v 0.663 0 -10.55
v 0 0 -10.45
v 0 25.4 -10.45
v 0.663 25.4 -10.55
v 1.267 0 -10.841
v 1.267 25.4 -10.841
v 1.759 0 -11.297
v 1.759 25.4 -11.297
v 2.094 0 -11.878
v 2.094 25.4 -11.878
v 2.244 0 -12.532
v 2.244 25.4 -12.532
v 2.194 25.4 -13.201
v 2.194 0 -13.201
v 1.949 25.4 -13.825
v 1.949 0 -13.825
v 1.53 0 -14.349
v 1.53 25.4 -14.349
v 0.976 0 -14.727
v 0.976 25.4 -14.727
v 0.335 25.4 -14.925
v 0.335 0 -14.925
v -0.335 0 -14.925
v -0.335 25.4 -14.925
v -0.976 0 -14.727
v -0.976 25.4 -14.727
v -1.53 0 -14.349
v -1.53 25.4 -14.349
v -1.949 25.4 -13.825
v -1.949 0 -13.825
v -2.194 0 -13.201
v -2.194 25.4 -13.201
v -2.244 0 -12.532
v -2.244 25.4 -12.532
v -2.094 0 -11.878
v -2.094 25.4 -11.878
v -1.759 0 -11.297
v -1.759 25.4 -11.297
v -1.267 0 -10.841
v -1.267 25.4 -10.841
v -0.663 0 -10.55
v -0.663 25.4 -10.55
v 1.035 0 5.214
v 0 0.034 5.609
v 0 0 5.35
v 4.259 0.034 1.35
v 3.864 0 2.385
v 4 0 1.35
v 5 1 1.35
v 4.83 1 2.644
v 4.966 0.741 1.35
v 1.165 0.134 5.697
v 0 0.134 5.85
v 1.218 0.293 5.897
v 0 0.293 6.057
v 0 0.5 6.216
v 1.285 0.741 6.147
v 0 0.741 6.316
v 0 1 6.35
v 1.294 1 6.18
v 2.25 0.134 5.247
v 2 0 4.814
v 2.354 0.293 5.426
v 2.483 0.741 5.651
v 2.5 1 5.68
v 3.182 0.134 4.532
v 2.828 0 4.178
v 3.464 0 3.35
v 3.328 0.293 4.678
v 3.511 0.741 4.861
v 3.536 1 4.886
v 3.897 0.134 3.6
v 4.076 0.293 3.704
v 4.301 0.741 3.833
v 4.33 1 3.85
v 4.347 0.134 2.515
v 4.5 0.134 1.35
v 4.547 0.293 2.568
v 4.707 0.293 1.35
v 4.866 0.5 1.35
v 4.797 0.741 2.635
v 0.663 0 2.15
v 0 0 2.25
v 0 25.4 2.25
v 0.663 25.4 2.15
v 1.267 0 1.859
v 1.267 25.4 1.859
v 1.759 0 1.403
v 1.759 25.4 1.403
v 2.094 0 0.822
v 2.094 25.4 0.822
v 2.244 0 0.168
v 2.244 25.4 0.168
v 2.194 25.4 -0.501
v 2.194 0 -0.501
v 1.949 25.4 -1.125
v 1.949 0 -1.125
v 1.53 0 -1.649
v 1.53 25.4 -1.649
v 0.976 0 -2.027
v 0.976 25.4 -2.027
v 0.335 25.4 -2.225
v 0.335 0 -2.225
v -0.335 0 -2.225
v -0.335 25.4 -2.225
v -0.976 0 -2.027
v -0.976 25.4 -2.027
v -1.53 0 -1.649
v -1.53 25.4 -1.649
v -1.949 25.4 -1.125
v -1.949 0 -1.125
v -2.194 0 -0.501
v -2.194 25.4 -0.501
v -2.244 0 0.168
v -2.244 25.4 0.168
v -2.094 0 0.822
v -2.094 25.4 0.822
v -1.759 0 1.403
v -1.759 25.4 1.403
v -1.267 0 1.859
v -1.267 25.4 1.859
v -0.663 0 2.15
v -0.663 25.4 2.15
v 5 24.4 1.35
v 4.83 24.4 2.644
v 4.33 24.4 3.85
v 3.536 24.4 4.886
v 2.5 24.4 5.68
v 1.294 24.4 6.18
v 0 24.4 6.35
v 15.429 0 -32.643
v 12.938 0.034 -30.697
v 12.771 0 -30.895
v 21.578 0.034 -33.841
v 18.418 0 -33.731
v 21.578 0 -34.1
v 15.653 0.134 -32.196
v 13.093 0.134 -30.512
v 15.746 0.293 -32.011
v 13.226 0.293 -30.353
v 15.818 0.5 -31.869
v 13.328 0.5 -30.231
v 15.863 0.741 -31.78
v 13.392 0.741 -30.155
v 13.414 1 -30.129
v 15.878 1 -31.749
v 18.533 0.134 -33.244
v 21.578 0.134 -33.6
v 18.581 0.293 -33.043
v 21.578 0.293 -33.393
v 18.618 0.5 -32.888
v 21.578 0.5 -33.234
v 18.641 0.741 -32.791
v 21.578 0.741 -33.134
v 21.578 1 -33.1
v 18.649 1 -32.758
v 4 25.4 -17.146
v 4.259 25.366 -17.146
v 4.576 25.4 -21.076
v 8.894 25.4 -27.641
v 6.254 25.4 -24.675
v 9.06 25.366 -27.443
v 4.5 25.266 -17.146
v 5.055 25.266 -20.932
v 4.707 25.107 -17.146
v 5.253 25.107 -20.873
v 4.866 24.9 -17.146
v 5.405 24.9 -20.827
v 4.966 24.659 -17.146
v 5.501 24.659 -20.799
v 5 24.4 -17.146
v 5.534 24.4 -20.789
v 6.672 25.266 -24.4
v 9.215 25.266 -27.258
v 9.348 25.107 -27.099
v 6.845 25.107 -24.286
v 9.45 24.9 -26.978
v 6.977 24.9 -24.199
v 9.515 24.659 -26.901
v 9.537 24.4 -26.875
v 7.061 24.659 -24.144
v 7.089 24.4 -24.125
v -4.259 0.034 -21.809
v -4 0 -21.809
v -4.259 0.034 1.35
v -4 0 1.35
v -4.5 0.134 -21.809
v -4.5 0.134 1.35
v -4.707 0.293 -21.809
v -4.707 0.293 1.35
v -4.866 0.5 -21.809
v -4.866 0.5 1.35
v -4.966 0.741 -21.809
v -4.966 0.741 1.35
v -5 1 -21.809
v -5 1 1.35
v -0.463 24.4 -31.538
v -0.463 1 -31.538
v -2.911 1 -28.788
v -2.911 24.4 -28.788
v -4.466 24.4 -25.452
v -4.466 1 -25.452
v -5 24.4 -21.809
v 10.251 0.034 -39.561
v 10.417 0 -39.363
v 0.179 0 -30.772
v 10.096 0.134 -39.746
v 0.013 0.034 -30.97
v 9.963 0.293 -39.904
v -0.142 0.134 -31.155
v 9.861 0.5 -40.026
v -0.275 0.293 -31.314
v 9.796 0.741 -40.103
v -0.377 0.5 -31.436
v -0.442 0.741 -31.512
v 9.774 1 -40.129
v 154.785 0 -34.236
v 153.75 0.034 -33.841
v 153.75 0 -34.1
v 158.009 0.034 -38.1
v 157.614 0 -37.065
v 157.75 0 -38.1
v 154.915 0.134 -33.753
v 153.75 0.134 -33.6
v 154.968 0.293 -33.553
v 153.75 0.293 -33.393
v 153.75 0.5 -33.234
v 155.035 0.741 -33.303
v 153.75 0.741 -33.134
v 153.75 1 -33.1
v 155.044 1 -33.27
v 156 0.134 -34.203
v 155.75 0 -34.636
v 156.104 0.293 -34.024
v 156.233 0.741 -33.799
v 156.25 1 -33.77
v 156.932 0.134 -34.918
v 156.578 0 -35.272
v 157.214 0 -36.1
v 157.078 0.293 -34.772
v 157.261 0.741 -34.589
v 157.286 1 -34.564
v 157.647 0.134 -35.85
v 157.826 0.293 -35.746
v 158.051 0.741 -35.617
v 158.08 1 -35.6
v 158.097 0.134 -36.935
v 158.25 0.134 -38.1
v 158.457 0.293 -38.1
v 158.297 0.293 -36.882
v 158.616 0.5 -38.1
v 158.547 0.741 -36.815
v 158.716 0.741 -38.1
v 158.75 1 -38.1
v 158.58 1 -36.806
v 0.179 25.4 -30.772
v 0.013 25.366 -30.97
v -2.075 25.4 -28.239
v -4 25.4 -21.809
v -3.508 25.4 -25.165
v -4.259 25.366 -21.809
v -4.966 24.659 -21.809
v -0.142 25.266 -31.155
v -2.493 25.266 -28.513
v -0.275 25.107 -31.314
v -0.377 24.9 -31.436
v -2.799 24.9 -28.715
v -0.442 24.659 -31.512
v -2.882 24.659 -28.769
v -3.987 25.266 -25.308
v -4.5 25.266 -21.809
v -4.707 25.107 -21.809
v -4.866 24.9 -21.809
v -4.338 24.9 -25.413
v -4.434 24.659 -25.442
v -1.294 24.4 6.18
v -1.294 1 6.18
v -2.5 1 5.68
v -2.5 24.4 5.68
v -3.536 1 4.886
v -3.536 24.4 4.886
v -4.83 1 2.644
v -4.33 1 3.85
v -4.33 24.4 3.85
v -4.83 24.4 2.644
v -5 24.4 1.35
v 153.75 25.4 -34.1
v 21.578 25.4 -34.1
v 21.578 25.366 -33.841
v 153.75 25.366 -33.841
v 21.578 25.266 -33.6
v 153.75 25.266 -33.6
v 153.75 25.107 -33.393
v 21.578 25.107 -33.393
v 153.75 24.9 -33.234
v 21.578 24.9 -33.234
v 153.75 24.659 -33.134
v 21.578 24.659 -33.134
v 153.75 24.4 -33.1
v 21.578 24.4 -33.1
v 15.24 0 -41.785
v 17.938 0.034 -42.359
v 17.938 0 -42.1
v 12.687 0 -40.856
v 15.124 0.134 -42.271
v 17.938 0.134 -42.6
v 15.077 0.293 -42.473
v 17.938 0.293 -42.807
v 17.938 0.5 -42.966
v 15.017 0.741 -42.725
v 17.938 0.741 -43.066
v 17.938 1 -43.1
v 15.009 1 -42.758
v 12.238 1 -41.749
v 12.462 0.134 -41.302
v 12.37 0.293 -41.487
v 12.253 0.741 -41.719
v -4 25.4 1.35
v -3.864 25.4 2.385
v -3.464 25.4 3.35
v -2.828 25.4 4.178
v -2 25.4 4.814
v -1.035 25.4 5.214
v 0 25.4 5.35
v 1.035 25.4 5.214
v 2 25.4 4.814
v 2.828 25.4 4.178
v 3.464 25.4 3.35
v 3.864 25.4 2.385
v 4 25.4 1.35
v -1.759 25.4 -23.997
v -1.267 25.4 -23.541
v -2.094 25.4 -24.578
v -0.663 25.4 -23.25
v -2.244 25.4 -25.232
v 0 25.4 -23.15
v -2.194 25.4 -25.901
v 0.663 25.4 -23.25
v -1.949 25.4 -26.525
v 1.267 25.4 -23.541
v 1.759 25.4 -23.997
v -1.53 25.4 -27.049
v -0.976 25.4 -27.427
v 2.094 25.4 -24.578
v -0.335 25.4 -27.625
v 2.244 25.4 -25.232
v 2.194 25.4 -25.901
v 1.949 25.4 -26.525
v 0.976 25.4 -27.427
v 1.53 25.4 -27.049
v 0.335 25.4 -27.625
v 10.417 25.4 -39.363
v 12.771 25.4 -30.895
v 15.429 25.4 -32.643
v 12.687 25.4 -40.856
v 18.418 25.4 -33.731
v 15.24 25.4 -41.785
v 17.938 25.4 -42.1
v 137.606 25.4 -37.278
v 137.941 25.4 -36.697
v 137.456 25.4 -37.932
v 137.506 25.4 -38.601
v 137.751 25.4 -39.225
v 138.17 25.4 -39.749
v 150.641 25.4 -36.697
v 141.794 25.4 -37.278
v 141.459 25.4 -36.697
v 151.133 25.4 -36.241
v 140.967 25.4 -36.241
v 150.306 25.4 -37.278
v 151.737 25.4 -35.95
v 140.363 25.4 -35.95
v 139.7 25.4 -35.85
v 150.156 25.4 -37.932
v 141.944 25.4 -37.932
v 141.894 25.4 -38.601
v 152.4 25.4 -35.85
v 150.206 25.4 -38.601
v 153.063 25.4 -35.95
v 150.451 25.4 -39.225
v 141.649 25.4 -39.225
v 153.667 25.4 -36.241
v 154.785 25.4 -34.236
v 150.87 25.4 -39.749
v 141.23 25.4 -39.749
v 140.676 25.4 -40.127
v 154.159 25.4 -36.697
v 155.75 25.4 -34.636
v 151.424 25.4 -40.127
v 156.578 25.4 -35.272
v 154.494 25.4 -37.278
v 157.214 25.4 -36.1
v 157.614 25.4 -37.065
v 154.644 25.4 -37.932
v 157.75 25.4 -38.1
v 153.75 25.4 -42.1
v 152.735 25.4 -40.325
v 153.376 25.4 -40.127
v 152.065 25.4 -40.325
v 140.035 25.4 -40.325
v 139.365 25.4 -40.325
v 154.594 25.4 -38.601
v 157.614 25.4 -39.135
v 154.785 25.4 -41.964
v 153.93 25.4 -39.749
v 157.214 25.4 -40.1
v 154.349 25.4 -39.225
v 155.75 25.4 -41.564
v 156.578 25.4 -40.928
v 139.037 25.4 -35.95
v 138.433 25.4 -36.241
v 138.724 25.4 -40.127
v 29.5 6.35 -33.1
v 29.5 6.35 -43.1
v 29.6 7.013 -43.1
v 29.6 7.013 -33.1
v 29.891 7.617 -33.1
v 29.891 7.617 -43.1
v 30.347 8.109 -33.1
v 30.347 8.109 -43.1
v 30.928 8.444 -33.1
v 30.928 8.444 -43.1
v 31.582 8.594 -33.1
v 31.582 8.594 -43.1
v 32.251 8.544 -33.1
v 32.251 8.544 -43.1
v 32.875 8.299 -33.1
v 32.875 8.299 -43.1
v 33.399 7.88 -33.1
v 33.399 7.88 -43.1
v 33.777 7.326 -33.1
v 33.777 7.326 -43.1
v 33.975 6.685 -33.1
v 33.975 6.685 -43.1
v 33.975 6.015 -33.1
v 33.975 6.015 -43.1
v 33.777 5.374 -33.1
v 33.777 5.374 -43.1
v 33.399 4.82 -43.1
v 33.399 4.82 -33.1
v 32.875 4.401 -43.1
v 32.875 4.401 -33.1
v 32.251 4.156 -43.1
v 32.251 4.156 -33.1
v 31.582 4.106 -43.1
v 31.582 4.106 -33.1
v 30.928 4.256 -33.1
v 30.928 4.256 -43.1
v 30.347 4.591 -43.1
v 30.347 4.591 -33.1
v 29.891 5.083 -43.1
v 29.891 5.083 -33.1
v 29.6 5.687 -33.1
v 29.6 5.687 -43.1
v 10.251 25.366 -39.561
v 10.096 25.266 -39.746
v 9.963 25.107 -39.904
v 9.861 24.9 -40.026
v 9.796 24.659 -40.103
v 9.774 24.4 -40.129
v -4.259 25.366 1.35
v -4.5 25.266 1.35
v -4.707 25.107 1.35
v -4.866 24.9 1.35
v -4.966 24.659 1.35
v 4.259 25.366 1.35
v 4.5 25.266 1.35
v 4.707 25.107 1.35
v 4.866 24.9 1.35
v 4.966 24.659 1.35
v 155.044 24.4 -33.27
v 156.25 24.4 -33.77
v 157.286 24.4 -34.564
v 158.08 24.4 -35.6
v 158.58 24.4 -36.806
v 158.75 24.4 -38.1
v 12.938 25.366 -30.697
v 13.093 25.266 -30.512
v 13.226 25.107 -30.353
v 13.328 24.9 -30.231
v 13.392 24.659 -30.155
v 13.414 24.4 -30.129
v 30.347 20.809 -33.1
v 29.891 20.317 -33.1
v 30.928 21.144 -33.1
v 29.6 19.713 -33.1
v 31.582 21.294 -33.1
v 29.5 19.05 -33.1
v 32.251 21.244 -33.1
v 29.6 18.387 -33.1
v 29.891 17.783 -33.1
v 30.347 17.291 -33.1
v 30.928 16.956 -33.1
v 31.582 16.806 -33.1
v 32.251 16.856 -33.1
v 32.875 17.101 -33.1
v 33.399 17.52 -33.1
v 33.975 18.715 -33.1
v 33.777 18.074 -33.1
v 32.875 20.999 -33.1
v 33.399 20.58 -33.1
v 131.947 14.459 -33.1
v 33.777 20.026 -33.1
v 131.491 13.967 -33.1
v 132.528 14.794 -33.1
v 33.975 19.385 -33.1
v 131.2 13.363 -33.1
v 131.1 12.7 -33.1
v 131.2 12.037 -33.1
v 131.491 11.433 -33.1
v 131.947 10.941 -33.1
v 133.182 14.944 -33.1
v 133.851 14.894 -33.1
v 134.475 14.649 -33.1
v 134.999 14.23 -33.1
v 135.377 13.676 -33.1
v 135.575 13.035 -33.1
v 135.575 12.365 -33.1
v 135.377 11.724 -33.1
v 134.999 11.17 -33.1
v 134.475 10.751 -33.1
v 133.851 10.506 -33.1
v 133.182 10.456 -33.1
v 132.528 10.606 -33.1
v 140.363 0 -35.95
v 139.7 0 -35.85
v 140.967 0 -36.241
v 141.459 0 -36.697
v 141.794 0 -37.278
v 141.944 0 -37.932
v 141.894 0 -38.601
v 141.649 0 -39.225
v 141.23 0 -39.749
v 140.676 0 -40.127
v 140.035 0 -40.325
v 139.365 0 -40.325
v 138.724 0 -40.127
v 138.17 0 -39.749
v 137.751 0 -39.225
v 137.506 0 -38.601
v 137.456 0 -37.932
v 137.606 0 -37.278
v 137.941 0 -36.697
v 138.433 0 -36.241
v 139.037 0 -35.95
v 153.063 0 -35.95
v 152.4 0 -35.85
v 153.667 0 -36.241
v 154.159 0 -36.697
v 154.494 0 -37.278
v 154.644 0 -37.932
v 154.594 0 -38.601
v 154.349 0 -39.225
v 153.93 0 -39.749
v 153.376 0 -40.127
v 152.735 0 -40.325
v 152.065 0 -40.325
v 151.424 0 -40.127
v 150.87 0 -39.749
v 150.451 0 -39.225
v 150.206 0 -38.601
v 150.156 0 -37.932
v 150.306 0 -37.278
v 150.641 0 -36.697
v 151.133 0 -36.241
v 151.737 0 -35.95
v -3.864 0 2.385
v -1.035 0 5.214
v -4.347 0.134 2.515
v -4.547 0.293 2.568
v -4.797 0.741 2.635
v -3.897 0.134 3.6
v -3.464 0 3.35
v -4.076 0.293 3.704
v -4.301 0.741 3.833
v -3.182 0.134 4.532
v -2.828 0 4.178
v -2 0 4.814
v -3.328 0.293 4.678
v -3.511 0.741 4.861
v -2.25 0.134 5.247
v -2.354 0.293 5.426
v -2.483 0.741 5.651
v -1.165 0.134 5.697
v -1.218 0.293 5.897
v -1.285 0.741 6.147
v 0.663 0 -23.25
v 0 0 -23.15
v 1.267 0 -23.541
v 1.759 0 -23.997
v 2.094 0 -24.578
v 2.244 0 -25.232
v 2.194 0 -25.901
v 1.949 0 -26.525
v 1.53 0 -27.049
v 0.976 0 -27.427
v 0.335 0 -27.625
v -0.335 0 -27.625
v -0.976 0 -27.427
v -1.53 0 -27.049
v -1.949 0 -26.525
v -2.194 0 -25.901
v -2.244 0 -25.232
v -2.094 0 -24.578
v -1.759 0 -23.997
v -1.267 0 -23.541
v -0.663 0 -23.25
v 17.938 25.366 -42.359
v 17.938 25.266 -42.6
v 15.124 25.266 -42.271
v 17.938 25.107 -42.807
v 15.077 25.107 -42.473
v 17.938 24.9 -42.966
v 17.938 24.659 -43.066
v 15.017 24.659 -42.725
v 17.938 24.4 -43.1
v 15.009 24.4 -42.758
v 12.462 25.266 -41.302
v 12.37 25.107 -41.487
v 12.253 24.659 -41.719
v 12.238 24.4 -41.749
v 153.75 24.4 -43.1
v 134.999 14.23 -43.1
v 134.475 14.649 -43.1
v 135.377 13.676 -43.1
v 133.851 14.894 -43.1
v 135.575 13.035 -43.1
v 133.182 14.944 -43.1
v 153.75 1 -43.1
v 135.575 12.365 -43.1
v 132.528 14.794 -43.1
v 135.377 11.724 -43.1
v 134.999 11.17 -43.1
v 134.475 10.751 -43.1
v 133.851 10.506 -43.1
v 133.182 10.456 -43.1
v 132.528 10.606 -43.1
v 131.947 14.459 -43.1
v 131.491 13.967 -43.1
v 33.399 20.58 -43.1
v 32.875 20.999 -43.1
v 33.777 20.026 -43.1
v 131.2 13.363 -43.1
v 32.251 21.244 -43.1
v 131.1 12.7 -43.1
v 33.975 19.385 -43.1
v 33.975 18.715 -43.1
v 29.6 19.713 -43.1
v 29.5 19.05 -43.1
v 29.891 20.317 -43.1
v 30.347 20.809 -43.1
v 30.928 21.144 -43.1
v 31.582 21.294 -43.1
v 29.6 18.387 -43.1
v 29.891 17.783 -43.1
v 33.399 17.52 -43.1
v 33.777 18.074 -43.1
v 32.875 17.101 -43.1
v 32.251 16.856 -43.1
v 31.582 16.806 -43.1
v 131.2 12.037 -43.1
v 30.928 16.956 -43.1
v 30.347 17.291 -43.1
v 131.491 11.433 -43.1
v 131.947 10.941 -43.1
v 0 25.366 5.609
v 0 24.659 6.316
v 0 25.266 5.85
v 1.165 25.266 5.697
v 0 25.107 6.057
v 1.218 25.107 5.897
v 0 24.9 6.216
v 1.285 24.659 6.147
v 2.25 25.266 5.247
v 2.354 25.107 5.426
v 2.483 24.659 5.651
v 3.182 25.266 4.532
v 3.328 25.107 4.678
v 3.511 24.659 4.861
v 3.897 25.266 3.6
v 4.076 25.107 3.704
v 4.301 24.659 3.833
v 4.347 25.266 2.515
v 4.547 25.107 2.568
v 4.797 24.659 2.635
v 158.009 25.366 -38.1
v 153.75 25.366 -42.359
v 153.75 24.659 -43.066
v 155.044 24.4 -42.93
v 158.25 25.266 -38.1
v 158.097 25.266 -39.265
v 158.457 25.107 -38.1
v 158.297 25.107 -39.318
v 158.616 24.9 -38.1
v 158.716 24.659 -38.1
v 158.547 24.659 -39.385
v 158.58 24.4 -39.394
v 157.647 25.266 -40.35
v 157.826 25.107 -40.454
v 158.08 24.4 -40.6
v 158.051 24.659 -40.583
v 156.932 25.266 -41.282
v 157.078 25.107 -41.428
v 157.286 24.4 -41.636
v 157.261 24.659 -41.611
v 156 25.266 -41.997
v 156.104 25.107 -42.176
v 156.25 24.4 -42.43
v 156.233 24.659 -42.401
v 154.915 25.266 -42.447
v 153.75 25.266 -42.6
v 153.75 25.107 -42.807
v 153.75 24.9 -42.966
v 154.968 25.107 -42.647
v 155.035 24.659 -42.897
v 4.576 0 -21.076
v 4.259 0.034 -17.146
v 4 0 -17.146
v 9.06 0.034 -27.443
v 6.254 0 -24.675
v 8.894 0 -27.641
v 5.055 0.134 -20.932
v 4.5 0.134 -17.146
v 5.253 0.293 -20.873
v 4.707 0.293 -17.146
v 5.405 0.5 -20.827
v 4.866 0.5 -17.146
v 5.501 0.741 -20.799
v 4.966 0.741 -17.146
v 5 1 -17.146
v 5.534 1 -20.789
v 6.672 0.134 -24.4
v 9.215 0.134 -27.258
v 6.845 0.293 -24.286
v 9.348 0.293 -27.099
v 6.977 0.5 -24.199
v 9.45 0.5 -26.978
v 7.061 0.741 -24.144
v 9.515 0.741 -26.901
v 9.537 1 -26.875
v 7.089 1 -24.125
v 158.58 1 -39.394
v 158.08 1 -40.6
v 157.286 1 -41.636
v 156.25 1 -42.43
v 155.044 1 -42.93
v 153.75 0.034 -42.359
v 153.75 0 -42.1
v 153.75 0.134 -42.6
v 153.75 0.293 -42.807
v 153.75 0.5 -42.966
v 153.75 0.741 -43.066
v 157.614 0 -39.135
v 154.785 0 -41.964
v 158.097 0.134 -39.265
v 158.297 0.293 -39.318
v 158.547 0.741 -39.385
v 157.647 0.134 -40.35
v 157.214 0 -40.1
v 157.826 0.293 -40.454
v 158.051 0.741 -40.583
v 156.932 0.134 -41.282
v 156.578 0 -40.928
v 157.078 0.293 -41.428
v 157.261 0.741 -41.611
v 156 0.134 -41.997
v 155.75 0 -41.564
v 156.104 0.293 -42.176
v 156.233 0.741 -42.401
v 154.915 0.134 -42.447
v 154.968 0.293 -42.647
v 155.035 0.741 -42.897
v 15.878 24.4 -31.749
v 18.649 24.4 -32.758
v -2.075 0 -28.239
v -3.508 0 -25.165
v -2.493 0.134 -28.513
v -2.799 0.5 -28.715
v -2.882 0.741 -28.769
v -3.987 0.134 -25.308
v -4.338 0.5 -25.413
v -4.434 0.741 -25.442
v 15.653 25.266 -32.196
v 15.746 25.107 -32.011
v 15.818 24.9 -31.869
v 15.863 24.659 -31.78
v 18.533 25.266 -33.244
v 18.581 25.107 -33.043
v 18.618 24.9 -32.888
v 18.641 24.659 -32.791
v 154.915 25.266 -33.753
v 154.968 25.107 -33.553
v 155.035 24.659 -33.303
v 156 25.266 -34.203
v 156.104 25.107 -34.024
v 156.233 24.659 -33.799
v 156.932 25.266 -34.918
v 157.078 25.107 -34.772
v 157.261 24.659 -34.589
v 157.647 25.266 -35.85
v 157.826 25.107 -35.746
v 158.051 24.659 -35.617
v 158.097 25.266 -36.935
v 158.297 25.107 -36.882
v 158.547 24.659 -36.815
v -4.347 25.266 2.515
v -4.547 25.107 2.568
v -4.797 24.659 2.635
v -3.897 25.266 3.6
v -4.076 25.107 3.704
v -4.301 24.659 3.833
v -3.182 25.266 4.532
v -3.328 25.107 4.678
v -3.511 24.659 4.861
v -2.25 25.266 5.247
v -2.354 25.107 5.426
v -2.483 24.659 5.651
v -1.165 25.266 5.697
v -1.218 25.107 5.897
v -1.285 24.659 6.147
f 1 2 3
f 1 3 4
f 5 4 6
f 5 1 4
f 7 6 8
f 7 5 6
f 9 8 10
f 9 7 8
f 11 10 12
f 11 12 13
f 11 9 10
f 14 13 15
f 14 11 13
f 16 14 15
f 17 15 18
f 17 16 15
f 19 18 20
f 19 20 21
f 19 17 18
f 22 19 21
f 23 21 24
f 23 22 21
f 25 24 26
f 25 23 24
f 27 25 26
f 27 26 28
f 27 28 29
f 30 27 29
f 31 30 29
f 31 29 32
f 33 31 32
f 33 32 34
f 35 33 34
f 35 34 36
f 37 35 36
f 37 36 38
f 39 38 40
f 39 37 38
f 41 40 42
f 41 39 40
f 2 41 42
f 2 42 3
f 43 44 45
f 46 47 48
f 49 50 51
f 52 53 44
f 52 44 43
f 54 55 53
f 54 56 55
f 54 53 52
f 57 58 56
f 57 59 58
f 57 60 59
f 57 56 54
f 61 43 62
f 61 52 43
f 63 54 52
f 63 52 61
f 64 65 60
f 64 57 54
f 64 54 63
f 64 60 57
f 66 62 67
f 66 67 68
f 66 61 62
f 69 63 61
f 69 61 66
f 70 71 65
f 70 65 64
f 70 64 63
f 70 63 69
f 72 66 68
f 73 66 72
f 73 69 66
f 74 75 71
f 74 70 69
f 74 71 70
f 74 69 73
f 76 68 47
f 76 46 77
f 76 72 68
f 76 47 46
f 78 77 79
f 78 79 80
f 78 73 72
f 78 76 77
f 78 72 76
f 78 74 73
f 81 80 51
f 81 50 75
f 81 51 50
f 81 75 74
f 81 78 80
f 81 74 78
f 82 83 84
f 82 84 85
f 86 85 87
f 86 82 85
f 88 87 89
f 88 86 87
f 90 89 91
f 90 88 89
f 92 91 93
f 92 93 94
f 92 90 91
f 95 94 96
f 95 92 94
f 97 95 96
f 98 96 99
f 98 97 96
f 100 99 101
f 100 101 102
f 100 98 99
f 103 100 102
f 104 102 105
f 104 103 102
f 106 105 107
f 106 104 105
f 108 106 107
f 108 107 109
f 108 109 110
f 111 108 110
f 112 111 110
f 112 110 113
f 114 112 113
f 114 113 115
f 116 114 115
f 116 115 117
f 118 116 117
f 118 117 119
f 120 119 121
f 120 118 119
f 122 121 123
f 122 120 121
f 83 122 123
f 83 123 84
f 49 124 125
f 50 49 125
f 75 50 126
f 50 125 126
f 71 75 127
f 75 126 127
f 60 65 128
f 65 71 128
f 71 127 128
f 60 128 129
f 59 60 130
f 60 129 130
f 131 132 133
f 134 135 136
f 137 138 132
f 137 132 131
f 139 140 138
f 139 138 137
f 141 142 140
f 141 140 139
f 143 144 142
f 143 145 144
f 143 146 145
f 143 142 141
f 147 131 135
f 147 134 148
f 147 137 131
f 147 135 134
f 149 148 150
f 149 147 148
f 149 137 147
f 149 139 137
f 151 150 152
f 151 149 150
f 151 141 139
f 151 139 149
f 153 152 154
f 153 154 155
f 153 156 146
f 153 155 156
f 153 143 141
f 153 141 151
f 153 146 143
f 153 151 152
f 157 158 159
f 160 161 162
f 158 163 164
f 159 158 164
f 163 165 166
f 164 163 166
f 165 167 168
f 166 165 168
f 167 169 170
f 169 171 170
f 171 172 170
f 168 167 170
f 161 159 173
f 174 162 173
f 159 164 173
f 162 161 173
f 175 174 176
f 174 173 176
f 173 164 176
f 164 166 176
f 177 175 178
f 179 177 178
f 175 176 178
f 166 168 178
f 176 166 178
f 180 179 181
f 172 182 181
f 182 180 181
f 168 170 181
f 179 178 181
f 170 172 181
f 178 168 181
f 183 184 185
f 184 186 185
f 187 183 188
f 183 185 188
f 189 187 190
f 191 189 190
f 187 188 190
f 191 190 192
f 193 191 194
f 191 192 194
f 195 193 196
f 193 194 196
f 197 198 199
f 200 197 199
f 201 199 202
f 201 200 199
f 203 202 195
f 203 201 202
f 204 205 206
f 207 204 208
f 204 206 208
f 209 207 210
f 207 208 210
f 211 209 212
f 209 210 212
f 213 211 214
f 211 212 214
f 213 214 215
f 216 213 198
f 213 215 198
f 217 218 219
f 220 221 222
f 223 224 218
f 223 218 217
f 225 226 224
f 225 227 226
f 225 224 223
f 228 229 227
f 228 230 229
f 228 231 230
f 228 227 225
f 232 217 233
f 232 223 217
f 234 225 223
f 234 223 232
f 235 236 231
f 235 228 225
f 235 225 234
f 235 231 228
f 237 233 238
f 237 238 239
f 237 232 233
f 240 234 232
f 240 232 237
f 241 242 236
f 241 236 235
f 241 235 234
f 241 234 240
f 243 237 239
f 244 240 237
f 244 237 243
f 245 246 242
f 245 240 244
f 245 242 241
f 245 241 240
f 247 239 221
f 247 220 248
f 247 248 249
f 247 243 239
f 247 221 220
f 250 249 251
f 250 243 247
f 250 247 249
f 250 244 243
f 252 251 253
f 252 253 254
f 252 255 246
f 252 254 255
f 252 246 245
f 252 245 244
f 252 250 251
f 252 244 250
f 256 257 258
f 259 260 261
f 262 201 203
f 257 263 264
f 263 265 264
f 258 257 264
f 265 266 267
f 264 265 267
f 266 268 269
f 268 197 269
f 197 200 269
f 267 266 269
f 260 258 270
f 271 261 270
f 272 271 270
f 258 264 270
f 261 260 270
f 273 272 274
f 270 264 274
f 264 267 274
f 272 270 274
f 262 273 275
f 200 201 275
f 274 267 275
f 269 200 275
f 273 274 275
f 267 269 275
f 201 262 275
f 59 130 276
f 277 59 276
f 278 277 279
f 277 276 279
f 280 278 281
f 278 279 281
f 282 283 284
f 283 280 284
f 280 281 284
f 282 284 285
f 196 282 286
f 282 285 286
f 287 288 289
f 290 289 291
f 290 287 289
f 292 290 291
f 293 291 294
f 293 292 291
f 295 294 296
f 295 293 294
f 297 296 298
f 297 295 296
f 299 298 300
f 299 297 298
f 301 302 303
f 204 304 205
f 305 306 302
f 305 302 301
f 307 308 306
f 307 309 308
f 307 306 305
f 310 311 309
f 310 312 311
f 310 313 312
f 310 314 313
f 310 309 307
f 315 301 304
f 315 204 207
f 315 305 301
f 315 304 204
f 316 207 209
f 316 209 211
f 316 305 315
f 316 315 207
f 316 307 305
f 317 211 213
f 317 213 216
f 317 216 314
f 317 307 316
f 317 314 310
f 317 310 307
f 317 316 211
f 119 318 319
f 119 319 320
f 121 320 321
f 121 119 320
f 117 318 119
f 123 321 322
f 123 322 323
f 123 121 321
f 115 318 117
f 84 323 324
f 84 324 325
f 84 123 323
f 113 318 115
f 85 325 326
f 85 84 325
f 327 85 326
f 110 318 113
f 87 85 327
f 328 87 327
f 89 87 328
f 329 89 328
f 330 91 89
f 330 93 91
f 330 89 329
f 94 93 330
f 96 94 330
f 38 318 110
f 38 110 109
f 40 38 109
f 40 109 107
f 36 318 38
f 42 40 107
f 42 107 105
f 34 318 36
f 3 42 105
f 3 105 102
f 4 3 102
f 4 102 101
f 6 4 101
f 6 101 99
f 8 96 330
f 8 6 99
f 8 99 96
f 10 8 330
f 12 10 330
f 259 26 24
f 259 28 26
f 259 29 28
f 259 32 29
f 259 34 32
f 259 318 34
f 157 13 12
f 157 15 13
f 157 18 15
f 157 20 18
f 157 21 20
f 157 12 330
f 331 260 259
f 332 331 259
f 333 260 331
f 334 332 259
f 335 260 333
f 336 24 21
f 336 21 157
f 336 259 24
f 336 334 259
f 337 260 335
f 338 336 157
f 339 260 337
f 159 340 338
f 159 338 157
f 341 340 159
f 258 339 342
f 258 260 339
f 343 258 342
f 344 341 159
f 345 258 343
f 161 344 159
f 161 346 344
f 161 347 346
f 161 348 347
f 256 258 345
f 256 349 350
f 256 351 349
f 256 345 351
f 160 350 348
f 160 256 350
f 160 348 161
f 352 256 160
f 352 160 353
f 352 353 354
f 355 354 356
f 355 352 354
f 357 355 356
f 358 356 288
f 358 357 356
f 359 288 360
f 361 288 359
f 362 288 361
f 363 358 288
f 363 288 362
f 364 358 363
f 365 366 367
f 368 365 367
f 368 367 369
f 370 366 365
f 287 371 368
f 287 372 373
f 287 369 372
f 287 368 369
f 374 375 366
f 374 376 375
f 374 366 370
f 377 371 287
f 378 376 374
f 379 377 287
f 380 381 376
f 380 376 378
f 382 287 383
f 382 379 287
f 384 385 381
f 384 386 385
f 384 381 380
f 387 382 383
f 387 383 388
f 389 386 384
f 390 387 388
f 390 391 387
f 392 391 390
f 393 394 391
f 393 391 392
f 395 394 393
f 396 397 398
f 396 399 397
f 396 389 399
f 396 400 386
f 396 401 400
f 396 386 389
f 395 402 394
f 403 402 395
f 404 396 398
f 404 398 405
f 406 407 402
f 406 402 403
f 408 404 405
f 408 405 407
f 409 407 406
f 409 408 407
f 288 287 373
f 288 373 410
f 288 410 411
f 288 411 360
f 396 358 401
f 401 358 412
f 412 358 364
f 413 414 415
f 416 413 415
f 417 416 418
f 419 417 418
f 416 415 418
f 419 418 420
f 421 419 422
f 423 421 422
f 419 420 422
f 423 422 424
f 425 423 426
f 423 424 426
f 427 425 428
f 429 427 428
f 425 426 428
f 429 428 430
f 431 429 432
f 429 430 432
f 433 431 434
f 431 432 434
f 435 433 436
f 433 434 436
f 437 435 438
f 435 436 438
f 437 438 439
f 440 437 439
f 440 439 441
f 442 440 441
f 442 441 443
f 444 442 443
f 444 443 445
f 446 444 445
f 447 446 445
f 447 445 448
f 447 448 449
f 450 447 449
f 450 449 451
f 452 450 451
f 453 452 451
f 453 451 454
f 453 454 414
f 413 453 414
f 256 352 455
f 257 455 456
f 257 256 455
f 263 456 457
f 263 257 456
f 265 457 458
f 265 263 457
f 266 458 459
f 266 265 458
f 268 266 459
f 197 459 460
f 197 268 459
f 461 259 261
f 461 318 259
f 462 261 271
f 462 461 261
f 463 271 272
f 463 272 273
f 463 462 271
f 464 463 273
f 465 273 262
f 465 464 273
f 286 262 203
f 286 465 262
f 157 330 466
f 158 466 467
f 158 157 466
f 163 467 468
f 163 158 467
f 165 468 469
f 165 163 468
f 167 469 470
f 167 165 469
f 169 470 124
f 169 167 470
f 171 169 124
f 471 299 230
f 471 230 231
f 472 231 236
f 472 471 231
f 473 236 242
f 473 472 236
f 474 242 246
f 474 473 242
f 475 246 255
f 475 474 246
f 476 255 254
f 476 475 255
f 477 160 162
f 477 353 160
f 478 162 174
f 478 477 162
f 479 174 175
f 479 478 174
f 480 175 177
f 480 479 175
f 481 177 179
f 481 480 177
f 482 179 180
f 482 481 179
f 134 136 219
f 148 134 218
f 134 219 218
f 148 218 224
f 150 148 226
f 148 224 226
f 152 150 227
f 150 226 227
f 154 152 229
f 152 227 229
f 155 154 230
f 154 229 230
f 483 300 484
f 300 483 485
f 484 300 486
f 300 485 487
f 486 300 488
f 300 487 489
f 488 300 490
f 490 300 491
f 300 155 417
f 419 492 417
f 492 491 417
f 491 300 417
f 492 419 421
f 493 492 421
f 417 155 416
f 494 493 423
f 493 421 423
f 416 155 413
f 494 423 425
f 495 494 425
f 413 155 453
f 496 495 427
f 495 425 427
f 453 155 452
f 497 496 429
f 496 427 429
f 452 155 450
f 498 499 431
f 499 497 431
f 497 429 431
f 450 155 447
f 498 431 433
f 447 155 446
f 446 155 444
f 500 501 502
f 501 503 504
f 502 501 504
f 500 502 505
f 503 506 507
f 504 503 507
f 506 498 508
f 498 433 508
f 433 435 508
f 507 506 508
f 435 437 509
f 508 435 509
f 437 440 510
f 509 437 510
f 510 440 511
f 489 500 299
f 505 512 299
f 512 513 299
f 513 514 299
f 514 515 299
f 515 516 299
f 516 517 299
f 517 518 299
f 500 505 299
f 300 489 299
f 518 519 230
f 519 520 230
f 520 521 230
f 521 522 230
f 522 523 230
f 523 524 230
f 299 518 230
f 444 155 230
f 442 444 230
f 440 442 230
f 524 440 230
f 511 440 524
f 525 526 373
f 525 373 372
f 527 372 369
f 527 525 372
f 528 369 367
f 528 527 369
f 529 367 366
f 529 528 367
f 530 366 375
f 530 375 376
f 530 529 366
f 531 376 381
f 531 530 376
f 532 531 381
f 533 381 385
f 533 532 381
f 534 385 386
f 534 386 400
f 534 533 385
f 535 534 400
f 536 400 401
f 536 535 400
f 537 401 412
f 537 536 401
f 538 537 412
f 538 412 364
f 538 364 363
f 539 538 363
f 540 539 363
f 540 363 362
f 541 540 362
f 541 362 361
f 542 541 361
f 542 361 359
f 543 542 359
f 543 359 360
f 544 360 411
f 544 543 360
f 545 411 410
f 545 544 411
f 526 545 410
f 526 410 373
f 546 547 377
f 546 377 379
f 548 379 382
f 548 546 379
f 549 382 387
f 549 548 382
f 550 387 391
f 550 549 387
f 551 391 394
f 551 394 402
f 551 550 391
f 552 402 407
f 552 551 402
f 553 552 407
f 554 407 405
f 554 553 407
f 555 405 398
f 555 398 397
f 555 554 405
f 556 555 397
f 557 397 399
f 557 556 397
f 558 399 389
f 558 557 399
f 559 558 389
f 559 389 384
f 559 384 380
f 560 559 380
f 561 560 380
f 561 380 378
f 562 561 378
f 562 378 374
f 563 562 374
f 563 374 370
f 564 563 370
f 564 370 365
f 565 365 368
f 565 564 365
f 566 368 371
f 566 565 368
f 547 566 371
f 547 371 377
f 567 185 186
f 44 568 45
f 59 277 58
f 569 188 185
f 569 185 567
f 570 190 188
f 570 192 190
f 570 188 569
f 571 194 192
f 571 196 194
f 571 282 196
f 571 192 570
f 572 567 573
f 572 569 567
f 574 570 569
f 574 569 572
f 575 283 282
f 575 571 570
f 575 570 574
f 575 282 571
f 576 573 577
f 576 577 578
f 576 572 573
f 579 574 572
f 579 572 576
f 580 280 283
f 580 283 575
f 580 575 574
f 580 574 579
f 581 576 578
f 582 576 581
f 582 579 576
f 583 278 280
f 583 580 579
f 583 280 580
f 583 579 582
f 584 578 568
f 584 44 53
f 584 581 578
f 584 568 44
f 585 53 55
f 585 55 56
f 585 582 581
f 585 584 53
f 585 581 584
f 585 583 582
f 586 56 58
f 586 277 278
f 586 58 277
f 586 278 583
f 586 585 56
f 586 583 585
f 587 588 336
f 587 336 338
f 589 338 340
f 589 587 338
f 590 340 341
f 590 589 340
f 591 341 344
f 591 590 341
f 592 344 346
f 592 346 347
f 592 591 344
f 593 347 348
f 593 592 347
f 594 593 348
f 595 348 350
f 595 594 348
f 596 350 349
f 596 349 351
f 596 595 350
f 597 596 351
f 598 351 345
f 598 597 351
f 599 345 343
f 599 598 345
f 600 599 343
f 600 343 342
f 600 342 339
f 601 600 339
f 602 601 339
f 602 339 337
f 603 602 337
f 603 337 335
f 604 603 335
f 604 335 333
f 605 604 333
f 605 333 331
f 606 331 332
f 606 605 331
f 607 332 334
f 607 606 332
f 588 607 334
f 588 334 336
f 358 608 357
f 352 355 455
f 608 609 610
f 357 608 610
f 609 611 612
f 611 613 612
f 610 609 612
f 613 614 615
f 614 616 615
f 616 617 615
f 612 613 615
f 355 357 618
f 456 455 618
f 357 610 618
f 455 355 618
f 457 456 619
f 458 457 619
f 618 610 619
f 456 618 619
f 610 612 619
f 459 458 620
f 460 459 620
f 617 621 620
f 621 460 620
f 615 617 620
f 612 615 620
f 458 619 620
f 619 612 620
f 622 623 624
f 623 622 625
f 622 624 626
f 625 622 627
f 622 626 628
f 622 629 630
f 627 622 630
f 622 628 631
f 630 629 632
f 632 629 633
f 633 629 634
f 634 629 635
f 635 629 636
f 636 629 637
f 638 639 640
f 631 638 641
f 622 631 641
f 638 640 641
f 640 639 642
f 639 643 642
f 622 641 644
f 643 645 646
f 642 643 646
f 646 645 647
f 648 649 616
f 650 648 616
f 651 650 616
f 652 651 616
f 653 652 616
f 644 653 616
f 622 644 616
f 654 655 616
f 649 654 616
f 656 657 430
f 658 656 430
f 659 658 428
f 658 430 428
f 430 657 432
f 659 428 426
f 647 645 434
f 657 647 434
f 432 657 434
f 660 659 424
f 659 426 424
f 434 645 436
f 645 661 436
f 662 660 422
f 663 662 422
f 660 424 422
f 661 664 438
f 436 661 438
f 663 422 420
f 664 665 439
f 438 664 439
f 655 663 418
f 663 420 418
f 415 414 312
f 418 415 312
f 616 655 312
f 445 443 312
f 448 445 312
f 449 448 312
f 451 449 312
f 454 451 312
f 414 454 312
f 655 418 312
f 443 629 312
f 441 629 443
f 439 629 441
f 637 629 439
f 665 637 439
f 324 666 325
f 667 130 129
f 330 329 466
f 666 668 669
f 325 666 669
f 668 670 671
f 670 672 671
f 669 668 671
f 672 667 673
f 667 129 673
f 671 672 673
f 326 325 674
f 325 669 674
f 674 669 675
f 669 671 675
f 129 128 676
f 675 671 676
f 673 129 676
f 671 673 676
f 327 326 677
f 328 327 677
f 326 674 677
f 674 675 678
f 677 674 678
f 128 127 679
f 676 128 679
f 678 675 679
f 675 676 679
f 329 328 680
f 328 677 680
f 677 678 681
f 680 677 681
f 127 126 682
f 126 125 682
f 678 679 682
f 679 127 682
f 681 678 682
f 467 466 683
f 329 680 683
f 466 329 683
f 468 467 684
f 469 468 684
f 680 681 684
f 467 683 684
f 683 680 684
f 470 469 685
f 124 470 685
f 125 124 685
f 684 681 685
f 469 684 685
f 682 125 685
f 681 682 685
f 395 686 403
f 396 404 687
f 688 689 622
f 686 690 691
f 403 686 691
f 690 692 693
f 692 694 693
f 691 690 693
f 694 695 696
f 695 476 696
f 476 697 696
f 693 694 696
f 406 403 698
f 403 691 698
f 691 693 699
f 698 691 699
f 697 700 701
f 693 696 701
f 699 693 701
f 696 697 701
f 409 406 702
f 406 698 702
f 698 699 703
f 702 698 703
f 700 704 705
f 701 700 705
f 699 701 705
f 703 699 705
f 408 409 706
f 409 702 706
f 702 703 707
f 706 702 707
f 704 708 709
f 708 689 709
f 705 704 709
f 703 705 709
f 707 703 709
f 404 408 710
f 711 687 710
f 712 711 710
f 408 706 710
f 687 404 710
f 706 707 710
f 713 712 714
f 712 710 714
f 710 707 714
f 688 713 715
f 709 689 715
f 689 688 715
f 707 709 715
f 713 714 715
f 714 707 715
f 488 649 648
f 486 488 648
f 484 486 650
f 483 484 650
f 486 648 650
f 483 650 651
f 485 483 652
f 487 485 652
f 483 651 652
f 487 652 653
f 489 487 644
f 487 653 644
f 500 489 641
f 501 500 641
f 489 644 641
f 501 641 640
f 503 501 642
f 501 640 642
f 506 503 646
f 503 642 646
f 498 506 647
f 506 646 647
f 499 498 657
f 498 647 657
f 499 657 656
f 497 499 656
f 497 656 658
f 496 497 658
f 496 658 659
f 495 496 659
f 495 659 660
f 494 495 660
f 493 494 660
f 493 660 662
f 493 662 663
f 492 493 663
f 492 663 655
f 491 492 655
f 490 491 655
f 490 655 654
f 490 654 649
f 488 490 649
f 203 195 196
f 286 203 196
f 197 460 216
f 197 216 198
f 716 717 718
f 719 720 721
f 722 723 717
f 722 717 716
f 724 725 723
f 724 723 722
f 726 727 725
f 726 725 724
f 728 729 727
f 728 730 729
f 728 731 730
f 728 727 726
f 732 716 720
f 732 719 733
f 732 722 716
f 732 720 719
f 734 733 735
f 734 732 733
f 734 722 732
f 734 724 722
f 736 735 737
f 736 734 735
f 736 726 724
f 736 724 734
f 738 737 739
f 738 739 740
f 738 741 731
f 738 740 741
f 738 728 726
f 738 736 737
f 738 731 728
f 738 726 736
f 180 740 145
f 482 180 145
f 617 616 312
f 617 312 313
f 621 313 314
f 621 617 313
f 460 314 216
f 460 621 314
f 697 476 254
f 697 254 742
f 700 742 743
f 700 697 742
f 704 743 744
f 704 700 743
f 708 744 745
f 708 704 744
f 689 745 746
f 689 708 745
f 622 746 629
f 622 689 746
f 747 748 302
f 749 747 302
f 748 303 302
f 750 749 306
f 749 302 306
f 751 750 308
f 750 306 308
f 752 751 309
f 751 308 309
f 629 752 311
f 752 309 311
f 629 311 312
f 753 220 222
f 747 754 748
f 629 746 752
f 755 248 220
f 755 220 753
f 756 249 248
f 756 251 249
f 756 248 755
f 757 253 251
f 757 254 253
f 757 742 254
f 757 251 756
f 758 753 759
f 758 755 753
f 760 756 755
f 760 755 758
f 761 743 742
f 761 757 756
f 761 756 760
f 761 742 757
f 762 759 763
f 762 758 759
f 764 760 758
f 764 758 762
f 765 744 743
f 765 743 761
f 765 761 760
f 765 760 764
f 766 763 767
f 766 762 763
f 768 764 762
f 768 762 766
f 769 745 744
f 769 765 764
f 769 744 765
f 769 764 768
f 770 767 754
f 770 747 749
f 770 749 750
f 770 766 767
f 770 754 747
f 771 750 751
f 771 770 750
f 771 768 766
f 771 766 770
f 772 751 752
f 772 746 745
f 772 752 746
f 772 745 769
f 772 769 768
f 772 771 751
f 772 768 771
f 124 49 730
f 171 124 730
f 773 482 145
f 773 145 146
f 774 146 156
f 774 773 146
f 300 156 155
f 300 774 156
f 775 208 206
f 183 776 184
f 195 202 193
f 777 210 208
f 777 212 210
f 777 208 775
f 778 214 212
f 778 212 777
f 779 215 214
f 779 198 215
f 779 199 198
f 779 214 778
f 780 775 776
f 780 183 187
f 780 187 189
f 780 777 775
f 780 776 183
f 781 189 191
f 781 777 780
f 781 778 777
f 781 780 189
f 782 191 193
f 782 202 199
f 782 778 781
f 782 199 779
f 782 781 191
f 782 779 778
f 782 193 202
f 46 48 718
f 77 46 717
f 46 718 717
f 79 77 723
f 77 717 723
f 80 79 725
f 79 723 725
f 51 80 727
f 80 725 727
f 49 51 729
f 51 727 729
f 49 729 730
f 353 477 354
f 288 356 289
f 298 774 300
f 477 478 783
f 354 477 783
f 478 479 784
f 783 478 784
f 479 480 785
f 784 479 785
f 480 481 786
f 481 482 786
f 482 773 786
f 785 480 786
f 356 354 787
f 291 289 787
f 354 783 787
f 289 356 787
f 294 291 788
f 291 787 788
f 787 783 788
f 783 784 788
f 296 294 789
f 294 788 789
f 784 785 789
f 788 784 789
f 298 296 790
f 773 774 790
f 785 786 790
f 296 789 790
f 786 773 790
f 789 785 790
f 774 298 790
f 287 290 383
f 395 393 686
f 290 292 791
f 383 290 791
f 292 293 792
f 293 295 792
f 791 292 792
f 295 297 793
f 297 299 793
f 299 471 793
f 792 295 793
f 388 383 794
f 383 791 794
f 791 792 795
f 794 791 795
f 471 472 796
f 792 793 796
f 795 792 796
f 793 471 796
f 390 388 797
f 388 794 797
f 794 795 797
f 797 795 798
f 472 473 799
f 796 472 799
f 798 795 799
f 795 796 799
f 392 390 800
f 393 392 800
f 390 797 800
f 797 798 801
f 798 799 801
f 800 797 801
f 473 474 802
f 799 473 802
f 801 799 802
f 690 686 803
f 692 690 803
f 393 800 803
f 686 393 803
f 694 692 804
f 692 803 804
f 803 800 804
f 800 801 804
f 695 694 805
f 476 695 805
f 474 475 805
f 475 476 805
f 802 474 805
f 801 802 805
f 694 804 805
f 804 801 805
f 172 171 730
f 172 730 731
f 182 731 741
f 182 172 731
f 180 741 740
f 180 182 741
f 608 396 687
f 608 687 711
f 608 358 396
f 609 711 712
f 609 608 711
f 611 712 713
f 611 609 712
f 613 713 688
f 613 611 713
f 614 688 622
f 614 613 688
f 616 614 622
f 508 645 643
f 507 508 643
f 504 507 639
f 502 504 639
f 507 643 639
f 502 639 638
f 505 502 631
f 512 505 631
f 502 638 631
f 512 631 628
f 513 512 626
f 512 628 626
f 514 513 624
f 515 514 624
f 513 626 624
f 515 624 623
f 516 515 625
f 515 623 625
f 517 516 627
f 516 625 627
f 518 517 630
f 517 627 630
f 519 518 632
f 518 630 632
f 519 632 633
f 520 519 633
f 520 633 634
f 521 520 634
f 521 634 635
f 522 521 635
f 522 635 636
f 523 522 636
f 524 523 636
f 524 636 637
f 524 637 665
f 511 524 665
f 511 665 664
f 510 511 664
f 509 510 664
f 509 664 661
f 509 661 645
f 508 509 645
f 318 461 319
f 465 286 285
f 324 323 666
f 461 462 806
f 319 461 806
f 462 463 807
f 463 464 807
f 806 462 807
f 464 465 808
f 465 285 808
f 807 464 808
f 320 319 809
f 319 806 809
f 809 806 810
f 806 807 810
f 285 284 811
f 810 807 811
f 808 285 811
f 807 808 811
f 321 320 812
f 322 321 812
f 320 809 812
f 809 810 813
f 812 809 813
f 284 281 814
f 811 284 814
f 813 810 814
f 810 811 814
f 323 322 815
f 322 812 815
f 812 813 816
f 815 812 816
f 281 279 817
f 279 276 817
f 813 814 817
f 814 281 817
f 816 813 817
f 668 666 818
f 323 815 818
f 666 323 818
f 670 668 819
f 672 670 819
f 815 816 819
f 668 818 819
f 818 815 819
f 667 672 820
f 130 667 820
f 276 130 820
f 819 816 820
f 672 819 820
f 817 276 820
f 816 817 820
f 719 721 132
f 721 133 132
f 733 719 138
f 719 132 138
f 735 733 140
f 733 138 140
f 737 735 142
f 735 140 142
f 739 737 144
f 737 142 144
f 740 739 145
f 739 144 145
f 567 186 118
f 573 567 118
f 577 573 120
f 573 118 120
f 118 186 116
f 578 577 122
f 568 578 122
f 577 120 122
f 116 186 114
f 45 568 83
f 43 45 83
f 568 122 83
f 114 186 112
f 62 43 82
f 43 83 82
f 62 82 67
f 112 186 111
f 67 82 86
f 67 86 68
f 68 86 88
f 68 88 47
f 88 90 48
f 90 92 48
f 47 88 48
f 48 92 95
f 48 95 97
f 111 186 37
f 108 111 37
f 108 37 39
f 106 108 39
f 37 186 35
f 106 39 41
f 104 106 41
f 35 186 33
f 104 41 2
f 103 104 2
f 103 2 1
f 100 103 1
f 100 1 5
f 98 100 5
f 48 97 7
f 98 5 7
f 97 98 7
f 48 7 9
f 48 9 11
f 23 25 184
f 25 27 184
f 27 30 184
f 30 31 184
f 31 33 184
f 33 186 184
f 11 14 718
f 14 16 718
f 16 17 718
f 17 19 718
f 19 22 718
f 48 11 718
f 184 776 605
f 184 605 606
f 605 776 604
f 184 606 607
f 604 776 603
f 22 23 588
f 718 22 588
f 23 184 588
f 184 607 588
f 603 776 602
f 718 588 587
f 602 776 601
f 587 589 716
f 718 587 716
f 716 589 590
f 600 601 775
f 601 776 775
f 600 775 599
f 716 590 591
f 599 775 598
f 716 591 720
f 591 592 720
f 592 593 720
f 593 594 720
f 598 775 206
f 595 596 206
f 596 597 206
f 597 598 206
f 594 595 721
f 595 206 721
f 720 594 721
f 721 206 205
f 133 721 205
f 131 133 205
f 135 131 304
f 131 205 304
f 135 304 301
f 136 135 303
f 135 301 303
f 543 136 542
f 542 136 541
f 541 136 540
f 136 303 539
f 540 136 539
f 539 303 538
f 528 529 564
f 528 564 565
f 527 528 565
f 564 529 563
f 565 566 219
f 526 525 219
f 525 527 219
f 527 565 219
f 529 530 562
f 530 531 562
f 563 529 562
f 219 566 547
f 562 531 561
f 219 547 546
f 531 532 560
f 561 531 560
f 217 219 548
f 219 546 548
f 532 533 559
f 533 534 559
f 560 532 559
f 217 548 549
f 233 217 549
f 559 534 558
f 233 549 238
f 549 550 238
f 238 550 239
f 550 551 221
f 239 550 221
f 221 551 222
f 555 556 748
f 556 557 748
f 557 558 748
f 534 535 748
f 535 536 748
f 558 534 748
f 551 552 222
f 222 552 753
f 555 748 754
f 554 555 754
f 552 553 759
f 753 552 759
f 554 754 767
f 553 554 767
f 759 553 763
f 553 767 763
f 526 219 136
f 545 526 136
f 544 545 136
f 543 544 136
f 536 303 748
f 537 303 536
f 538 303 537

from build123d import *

# Parameters (mm, degrees)
SKETCH1_R           = 2.25
BOSS_EXTRUDE1_DEPTH = 25.4
FILLET2_R           = 5
CUT_EXTRUDE2_REACH  = 170.202
SKETCH3_R           = 2.25
FILLET4_R           = 12.7
FILLET5_R           = 1


with BuildPart() as part:
    # Sketch1 → Boss-Extrude1 (new body)
    # profile 1 of 2: a face of its own
    with BuildSketch(Plane(origin=(0, 0, 0), x_dir=(1, 0, 0), z_dir=(0, 1, 0))):
        Polygon((158.75, 33.1), (158.75, 43.1), (13.315419455, 43.1), (-5, 27.731538291), (-5, -6.35), (5, -6.35), (5, 23.068461709), (5, 33.1), (16.955121797, 33.1), align=None)
        with Locations(Location((0, 0, 0), (0, 0, 270))):
            Circle(SKETCH1_R, mode=Mode.SUBTRACT)
        with Locations(Location((0, 12.7, 0), (0, 0, 270))):
            Circle(SKETCH1_R, mode=Mode.SUBTRACT)
        with Locations(Location((0, 25.4, 0), (0, 0, 270))):
            Circle(SKETCH1_R, mode=Mode.SUBTRACT)
        with Locations(Location((139.7, 38.1, 0), (0, 0, 270))):
            Circle(SKETCH1_R, mode=Mode.SUBTRACT)
        with Locations(Location((152.4, 38.1, 0), (0, 0, 270))):
            Circle(SKETCH1_R, mode=Mode.SUBTRACT)
    # profile 2 of 2: a face of its own
    with BuildSketch(Plane(origin=(0, 0, 0), x_dir=(1, 0, 0), z_dir=(0, 1, 0))):
        Polygon((5, 23.068461709), (16.955121797, 33.1), (5, 33.1), align=None)
    extrude(amount=BOSS_EXTRUDE1_DEPTH)

    # Fillet2
    fillet2_edges = [part.edges().sort_by_distance(p)[0] for p in [
        (-5, 12.7, 6.35),
        (5, 12.7, 6.35),
        (158.75, 12.7, -43.1),
        (158.75, 12.7, -33.1),
    ]]
    fillet(fillet2_edges, radius=FILLET2_R - 0.0001)  # a hair under: the kernel refuses the full size

    # Sketch3 → Cut-Extrude2 (cut, up to next)
    with BuildSketch(Plane(origin=(0, 0, -43.1), x_dir=(-1, 0, 0), z_dir=(0, 0, -1)), mode=Mode.PRIVATE) as cut_extrude2_sk1:
        with Locations((-31.75, 6.35)):
            Circle(SKETCH3_R)
    cut_extrude2_tool1 = extrude(cut_extrude2_sk1.sketch, amount=-CUT_EXTRUDE2_REACH, mode=Mode.PRIVATE) & part.part
    # Sketch3 → Cut-Extrude2 (cut, up to next)
    with BuildSketch(Plane(origin=(0, 0, -43.1), x_dir=(-1, 0, 0), z_dir=(0, 0, -1)), mode=Mode.PRIVATE) as cut_extrude2_sk2:
        with Locations((-31.75, 19.05)):
            Circle(SKETCH3_R)
    cut_extrude2_tool2 = extrude(cut_extrude2_sk2.sketch, amount=-CUT_EXTRUDE2_REACH, mode=Mode.PRIVATE) & part.part
    # Sketch3 → Cut-Extrude2 (cut, up to next)
    with BuildSketch(Plane(origin=(0, 0, -43.1), x_dir=(-1, 0, 0), z_dir=(0, 0, -1)), mode=Mode.PRIVATE) as cut_extrude2_sk3:
        with Locations((-133.35, 12.7)):
            Circle(SKETCH3_R)
    cut_extrude2_tool3 = extrude(cut_extrude2_sk3.sketch, amount=-CUT_EXTRUDE2_REACH, mode=Mode.PRIVATE) & part.part
    add(cut_extrude2_tool1.solids().sort_by_distance((31.75, 6.35, -43.1))[0], mode=Mode.SUBTRACT)
    add(cut_extrude2_tool2.solids().sort_by_distance((31.75, 19.05, -43.1))[0], mode=Mode.SUBTRACT)
    add(cut_extrude2_tool3.solids().sort_by_distance((133.35, 12.7, -43.1))[0], mode=Mode.SUBTRACT)

    # Fillet4
    fillet4_edges = [part.edges().sort_by_distance(p)[0] for p in [
        (-5, 12.7, -27.731538291),
        (13.315419455, 12.7, -43.1),
        (16.955121797, 12.7, -33.1),
        (5, 12.7, -23.068461709),
    ]]
    fillet(fillet4_edges, radius=FILLET4_R)

    # Fillet5
    fillet5_edges = [part.edges().sort_by_distance(p)[0] for p in [
        (-5, 0, -10.229665516),
        (87.663821886, 0, -33.1),
        (157.285563195, 0, -34.564436805),
        (157.285563195, 0, -41.635563195),
        (3.535563195, 0, 4.885563195),
        (-3.535563195, 0, 4.885563195),
        (-5, 25.4, -10.229665516),
        (87.663821886, 25.4, -33.1),
        (157.285563195, 25.4, -34.564436805),
        (157.285563195, 25.4, -41.635563195),
        (3.535563195, 25.4, 4.885563195),
        (-3.535563195, 25.4, 4.885563195),
        (11.475369243, 0, -28.501941653),
        (11.475369243, 25.4, -28.501941653),
        (5, 25.4, -7.898127225),
        (5, 0, -7.898127225),
        (4.655518072, 0, -35.833479944),
        (4.655518072, 25.4, -35.833479944),
        (85.843970715, 0, -43.1),
        (-3.810108895, 0, -27.176682956),
        (13.59418561, 0, -42.334096284),
        (85.843970715, 25.4, -43.1),
        (-3.810108895, 25.4, -27.176682956),
        (13.59418561, 25.4, -42.334096284),
        (17.233887952, 0, -32.334096284),
        (17.233887952, 25.4, -32.334096284),
        (6.189891105, 0, -22.513606375),
        (6.189891105, 25.4, -22.513606375),
    ]]
    fillet(fillet5_edges, radius=FILLET5_R)


solid = part.part
